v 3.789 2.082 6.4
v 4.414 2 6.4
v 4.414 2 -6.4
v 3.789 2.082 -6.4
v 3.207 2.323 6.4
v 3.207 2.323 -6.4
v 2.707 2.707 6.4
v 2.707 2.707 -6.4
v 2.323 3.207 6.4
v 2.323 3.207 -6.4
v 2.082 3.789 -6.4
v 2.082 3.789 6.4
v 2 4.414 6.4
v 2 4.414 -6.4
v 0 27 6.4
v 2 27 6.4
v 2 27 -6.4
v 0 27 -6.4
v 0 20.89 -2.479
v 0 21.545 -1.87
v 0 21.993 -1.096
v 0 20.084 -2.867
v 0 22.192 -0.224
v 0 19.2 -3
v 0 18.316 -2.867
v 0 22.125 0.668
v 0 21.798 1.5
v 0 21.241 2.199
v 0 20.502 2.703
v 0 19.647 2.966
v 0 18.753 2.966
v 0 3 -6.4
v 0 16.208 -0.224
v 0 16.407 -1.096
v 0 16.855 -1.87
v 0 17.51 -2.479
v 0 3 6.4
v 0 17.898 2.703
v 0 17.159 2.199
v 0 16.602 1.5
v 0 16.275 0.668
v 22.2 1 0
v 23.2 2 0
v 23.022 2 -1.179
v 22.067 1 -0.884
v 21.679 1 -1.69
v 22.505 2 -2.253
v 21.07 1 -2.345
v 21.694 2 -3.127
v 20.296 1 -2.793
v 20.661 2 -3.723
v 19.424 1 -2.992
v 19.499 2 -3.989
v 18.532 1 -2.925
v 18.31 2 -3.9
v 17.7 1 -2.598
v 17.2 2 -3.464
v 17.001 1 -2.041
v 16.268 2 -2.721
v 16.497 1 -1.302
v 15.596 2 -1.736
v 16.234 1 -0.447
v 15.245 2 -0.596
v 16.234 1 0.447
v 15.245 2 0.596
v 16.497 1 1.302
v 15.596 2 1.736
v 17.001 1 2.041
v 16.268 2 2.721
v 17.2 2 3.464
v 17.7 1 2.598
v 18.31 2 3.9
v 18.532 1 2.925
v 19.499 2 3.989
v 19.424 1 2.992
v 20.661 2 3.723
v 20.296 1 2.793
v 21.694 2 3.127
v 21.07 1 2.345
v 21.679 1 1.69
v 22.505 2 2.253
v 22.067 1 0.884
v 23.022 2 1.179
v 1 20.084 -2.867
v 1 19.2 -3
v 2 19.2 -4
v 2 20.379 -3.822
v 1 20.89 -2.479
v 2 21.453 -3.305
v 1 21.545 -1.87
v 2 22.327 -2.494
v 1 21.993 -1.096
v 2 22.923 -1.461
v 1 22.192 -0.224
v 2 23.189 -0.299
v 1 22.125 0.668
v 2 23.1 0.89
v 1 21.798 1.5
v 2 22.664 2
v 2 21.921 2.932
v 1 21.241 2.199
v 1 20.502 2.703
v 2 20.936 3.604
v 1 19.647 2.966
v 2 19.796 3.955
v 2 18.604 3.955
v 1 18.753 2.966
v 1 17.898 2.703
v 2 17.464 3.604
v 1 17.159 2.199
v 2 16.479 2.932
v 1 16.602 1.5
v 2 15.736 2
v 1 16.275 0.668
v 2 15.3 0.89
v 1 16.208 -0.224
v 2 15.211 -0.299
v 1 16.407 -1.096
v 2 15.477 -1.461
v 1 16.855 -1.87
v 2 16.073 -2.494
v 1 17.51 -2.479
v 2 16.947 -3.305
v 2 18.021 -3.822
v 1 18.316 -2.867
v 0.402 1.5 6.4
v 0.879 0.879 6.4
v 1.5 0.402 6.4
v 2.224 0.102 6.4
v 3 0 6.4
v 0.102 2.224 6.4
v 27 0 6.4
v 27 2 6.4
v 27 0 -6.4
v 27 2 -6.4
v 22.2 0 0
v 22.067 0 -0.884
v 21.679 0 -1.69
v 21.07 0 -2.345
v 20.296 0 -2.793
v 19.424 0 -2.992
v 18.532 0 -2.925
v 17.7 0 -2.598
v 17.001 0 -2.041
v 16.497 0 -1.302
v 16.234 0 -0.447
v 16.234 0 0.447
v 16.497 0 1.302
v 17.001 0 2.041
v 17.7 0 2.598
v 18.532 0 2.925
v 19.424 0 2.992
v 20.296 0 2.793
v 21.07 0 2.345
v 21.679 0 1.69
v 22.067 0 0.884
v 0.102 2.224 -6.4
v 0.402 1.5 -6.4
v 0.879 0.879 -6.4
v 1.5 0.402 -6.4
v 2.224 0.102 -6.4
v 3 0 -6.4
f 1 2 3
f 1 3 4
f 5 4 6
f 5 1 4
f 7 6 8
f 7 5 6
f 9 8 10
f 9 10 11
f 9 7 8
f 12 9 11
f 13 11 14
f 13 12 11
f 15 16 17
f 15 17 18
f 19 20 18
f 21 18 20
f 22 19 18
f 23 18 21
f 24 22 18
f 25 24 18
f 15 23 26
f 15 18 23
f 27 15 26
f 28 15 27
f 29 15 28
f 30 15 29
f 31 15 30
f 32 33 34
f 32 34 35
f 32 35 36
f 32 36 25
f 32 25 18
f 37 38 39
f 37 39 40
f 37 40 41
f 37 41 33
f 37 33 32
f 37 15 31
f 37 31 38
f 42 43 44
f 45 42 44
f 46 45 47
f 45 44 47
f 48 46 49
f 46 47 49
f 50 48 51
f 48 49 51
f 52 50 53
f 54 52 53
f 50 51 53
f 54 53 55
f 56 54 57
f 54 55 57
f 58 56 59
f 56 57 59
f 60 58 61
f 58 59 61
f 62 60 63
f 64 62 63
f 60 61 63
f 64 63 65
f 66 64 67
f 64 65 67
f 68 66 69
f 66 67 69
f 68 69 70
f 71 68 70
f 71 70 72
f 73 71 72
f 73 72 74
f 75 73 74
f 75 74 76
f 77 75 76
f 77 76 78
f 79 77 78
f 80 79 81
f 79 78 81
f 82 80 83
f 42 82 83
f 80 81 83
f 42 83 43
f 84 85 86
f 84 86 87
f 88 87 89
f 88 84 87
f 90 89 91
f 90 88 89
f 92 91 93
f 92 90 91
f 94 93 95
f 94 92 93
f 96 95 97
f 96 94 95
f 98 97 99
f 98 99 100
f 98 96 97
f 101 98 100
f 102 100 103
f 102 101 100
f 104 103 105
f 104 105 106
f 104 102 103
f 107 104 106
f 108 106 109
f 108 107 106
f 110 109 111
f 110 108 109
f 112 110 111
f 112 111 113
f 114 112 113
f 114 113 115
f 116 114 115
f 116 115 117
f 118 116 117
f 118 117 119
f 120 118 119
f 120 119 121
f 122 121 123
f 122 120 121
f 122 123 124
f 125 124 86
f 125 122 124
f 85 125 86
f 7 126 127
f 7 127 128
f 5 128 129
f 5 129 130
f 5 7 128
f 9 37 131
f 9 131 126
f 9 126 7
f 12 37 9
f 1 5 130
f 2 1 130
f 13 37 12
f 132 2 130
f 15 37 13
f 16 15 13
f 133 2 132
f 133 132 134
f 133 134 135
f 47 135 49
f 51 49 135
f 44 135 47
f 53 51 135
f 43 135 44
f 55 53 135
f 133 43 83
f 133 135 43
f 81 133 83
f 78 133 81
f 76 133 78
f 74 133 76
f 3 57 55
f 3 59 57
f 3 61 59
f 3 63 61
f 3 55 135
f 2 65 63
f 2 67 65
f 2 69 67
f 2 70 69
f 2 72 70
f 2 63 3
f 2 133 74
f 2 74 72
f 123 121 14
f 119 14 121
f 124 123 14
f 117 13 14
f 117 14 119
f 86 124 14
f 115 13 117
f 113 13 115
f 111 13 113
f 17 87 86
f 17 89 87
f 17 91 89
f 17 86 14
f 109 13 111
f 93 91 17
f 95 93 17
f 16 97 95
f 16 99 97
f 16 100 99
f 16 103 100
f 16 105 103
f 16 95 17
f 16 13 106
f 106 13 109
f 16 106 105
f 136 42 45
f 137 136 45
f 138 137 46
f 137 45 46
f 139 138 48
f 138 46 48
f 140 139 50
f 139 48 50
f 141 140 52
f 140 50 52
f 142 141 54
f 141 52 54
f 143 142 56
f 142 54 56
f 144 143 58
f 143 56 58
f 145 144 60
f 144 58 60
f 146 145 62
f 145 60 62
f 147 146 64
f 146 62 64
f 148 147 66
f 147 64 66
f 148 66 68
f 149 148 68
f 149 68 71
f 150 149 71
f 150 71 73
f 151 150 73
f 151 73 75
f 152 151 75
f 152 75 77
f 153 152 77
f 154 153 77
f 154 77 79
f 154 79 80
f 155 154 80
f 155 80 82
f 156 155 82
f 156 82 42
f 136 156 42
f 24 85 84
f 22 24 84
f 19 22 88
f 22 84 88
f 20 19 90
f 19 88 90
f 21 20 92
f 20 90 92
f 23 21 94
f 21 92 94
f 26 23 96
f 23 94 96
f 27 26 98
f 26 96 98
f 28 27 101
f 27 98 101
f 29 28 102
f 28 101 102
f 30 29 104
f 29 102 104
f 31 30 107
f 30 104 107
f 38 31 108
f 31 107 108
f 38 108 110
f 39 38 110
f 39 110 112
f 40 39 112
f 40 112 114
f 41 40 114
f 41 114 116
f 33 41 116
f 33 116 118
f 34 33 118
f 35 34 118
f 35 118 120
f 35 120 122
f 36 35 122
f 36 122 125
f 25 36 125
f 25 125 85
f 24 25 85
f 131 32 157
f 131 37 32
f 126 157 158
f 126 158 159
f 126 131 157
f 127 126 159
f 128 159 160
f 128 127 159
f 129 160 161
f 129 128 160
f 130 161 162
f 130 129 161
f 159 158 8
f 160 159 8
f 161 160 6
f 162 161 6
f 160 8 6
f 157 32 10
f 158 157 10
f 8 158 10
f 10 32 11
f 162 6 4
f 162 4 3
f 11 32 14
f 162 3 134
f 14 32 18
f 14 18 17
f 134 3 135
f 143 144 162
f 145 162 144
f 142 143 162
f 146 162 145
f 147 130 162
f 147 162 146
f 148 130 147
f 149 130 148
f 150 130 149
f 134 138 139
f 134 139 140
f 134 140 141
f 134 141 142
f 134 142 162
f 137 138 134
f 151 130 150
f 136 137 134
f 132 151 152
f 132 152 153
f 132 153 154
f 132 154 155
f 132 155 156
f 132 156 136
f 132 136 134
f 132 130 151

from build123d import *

# Parameters (mm, degrees)
BOSS_EXTRUDE1_DEPTH = 6.4
SKETCH2_R           = 3
CUT_EXTRUDE1_DEPTH  = 3
SKETCH3_R           = 3
CUT_EXTRUDE2_DEPTH  = 3
CHAMFER1_SIZE       = 1


with BuildPart() as part:
    # Sketch1 → Boss-Extrude1 (new body, symmetric)
    with BuildSketch(Plane.XY):
        with BuildLine():
            Line((3, 0), (27, 0))
            Line((27, 0), (27, 2))
            Line((27, 2), (4.414213562, 2))
            ThreePointArc((4.414213562, 2), (2.707106781, 2.707106781), (2, 4.414213562))
            Line((2, 4.414213562), (2, 27))
            Line((2, 27), (0, 27))
            Line((0, 27), (0, 3))
            ThreePointArc((0, 3), (0.878679656, 0.878679656), (3, 0))
        make_face()
    extrude(amount=BOSS_EXTRUDE1_DEPTH, both=True)

    # Sketch2 → Cut-Extrude1 (cut, through all)
    with BuildSketch(Plane(origin=(0, 2, 0), x_dir=(1, 0, 0), z_dir=(0, 1, 0))):
        with Locations((19.2, 0)):
            Circle(SKETCH2_R)
    extrude(amount=-CUT_EXTRUDE1_DEPTH, mode=Mode.SUBTRACT)

    # Sketch3 → Cut-Extrude2 (cut, through all)
    with BuildSketch(Plane(origin=(2, 0, 0), x_dir=(0, 0, -1), z_dir=(1, 0, 0))):
        with Locations((0, 19.2)):
            Circle(SKETCH3_R)
    extrude(amount=-CUT_EXTRUDE2_DEPTH, mode=Mode.SUBTRACT)

    # Chamfer1
    chamfer1_edges = [part.edges().sort_by_distance(p)[0] for p in [
        (16.2, 2, 0),
        (2, 19.2, 3),
    ]]
    chamfer(chamfer1_edges, length=CHAMFER1_SIZE)


solid = part.part
